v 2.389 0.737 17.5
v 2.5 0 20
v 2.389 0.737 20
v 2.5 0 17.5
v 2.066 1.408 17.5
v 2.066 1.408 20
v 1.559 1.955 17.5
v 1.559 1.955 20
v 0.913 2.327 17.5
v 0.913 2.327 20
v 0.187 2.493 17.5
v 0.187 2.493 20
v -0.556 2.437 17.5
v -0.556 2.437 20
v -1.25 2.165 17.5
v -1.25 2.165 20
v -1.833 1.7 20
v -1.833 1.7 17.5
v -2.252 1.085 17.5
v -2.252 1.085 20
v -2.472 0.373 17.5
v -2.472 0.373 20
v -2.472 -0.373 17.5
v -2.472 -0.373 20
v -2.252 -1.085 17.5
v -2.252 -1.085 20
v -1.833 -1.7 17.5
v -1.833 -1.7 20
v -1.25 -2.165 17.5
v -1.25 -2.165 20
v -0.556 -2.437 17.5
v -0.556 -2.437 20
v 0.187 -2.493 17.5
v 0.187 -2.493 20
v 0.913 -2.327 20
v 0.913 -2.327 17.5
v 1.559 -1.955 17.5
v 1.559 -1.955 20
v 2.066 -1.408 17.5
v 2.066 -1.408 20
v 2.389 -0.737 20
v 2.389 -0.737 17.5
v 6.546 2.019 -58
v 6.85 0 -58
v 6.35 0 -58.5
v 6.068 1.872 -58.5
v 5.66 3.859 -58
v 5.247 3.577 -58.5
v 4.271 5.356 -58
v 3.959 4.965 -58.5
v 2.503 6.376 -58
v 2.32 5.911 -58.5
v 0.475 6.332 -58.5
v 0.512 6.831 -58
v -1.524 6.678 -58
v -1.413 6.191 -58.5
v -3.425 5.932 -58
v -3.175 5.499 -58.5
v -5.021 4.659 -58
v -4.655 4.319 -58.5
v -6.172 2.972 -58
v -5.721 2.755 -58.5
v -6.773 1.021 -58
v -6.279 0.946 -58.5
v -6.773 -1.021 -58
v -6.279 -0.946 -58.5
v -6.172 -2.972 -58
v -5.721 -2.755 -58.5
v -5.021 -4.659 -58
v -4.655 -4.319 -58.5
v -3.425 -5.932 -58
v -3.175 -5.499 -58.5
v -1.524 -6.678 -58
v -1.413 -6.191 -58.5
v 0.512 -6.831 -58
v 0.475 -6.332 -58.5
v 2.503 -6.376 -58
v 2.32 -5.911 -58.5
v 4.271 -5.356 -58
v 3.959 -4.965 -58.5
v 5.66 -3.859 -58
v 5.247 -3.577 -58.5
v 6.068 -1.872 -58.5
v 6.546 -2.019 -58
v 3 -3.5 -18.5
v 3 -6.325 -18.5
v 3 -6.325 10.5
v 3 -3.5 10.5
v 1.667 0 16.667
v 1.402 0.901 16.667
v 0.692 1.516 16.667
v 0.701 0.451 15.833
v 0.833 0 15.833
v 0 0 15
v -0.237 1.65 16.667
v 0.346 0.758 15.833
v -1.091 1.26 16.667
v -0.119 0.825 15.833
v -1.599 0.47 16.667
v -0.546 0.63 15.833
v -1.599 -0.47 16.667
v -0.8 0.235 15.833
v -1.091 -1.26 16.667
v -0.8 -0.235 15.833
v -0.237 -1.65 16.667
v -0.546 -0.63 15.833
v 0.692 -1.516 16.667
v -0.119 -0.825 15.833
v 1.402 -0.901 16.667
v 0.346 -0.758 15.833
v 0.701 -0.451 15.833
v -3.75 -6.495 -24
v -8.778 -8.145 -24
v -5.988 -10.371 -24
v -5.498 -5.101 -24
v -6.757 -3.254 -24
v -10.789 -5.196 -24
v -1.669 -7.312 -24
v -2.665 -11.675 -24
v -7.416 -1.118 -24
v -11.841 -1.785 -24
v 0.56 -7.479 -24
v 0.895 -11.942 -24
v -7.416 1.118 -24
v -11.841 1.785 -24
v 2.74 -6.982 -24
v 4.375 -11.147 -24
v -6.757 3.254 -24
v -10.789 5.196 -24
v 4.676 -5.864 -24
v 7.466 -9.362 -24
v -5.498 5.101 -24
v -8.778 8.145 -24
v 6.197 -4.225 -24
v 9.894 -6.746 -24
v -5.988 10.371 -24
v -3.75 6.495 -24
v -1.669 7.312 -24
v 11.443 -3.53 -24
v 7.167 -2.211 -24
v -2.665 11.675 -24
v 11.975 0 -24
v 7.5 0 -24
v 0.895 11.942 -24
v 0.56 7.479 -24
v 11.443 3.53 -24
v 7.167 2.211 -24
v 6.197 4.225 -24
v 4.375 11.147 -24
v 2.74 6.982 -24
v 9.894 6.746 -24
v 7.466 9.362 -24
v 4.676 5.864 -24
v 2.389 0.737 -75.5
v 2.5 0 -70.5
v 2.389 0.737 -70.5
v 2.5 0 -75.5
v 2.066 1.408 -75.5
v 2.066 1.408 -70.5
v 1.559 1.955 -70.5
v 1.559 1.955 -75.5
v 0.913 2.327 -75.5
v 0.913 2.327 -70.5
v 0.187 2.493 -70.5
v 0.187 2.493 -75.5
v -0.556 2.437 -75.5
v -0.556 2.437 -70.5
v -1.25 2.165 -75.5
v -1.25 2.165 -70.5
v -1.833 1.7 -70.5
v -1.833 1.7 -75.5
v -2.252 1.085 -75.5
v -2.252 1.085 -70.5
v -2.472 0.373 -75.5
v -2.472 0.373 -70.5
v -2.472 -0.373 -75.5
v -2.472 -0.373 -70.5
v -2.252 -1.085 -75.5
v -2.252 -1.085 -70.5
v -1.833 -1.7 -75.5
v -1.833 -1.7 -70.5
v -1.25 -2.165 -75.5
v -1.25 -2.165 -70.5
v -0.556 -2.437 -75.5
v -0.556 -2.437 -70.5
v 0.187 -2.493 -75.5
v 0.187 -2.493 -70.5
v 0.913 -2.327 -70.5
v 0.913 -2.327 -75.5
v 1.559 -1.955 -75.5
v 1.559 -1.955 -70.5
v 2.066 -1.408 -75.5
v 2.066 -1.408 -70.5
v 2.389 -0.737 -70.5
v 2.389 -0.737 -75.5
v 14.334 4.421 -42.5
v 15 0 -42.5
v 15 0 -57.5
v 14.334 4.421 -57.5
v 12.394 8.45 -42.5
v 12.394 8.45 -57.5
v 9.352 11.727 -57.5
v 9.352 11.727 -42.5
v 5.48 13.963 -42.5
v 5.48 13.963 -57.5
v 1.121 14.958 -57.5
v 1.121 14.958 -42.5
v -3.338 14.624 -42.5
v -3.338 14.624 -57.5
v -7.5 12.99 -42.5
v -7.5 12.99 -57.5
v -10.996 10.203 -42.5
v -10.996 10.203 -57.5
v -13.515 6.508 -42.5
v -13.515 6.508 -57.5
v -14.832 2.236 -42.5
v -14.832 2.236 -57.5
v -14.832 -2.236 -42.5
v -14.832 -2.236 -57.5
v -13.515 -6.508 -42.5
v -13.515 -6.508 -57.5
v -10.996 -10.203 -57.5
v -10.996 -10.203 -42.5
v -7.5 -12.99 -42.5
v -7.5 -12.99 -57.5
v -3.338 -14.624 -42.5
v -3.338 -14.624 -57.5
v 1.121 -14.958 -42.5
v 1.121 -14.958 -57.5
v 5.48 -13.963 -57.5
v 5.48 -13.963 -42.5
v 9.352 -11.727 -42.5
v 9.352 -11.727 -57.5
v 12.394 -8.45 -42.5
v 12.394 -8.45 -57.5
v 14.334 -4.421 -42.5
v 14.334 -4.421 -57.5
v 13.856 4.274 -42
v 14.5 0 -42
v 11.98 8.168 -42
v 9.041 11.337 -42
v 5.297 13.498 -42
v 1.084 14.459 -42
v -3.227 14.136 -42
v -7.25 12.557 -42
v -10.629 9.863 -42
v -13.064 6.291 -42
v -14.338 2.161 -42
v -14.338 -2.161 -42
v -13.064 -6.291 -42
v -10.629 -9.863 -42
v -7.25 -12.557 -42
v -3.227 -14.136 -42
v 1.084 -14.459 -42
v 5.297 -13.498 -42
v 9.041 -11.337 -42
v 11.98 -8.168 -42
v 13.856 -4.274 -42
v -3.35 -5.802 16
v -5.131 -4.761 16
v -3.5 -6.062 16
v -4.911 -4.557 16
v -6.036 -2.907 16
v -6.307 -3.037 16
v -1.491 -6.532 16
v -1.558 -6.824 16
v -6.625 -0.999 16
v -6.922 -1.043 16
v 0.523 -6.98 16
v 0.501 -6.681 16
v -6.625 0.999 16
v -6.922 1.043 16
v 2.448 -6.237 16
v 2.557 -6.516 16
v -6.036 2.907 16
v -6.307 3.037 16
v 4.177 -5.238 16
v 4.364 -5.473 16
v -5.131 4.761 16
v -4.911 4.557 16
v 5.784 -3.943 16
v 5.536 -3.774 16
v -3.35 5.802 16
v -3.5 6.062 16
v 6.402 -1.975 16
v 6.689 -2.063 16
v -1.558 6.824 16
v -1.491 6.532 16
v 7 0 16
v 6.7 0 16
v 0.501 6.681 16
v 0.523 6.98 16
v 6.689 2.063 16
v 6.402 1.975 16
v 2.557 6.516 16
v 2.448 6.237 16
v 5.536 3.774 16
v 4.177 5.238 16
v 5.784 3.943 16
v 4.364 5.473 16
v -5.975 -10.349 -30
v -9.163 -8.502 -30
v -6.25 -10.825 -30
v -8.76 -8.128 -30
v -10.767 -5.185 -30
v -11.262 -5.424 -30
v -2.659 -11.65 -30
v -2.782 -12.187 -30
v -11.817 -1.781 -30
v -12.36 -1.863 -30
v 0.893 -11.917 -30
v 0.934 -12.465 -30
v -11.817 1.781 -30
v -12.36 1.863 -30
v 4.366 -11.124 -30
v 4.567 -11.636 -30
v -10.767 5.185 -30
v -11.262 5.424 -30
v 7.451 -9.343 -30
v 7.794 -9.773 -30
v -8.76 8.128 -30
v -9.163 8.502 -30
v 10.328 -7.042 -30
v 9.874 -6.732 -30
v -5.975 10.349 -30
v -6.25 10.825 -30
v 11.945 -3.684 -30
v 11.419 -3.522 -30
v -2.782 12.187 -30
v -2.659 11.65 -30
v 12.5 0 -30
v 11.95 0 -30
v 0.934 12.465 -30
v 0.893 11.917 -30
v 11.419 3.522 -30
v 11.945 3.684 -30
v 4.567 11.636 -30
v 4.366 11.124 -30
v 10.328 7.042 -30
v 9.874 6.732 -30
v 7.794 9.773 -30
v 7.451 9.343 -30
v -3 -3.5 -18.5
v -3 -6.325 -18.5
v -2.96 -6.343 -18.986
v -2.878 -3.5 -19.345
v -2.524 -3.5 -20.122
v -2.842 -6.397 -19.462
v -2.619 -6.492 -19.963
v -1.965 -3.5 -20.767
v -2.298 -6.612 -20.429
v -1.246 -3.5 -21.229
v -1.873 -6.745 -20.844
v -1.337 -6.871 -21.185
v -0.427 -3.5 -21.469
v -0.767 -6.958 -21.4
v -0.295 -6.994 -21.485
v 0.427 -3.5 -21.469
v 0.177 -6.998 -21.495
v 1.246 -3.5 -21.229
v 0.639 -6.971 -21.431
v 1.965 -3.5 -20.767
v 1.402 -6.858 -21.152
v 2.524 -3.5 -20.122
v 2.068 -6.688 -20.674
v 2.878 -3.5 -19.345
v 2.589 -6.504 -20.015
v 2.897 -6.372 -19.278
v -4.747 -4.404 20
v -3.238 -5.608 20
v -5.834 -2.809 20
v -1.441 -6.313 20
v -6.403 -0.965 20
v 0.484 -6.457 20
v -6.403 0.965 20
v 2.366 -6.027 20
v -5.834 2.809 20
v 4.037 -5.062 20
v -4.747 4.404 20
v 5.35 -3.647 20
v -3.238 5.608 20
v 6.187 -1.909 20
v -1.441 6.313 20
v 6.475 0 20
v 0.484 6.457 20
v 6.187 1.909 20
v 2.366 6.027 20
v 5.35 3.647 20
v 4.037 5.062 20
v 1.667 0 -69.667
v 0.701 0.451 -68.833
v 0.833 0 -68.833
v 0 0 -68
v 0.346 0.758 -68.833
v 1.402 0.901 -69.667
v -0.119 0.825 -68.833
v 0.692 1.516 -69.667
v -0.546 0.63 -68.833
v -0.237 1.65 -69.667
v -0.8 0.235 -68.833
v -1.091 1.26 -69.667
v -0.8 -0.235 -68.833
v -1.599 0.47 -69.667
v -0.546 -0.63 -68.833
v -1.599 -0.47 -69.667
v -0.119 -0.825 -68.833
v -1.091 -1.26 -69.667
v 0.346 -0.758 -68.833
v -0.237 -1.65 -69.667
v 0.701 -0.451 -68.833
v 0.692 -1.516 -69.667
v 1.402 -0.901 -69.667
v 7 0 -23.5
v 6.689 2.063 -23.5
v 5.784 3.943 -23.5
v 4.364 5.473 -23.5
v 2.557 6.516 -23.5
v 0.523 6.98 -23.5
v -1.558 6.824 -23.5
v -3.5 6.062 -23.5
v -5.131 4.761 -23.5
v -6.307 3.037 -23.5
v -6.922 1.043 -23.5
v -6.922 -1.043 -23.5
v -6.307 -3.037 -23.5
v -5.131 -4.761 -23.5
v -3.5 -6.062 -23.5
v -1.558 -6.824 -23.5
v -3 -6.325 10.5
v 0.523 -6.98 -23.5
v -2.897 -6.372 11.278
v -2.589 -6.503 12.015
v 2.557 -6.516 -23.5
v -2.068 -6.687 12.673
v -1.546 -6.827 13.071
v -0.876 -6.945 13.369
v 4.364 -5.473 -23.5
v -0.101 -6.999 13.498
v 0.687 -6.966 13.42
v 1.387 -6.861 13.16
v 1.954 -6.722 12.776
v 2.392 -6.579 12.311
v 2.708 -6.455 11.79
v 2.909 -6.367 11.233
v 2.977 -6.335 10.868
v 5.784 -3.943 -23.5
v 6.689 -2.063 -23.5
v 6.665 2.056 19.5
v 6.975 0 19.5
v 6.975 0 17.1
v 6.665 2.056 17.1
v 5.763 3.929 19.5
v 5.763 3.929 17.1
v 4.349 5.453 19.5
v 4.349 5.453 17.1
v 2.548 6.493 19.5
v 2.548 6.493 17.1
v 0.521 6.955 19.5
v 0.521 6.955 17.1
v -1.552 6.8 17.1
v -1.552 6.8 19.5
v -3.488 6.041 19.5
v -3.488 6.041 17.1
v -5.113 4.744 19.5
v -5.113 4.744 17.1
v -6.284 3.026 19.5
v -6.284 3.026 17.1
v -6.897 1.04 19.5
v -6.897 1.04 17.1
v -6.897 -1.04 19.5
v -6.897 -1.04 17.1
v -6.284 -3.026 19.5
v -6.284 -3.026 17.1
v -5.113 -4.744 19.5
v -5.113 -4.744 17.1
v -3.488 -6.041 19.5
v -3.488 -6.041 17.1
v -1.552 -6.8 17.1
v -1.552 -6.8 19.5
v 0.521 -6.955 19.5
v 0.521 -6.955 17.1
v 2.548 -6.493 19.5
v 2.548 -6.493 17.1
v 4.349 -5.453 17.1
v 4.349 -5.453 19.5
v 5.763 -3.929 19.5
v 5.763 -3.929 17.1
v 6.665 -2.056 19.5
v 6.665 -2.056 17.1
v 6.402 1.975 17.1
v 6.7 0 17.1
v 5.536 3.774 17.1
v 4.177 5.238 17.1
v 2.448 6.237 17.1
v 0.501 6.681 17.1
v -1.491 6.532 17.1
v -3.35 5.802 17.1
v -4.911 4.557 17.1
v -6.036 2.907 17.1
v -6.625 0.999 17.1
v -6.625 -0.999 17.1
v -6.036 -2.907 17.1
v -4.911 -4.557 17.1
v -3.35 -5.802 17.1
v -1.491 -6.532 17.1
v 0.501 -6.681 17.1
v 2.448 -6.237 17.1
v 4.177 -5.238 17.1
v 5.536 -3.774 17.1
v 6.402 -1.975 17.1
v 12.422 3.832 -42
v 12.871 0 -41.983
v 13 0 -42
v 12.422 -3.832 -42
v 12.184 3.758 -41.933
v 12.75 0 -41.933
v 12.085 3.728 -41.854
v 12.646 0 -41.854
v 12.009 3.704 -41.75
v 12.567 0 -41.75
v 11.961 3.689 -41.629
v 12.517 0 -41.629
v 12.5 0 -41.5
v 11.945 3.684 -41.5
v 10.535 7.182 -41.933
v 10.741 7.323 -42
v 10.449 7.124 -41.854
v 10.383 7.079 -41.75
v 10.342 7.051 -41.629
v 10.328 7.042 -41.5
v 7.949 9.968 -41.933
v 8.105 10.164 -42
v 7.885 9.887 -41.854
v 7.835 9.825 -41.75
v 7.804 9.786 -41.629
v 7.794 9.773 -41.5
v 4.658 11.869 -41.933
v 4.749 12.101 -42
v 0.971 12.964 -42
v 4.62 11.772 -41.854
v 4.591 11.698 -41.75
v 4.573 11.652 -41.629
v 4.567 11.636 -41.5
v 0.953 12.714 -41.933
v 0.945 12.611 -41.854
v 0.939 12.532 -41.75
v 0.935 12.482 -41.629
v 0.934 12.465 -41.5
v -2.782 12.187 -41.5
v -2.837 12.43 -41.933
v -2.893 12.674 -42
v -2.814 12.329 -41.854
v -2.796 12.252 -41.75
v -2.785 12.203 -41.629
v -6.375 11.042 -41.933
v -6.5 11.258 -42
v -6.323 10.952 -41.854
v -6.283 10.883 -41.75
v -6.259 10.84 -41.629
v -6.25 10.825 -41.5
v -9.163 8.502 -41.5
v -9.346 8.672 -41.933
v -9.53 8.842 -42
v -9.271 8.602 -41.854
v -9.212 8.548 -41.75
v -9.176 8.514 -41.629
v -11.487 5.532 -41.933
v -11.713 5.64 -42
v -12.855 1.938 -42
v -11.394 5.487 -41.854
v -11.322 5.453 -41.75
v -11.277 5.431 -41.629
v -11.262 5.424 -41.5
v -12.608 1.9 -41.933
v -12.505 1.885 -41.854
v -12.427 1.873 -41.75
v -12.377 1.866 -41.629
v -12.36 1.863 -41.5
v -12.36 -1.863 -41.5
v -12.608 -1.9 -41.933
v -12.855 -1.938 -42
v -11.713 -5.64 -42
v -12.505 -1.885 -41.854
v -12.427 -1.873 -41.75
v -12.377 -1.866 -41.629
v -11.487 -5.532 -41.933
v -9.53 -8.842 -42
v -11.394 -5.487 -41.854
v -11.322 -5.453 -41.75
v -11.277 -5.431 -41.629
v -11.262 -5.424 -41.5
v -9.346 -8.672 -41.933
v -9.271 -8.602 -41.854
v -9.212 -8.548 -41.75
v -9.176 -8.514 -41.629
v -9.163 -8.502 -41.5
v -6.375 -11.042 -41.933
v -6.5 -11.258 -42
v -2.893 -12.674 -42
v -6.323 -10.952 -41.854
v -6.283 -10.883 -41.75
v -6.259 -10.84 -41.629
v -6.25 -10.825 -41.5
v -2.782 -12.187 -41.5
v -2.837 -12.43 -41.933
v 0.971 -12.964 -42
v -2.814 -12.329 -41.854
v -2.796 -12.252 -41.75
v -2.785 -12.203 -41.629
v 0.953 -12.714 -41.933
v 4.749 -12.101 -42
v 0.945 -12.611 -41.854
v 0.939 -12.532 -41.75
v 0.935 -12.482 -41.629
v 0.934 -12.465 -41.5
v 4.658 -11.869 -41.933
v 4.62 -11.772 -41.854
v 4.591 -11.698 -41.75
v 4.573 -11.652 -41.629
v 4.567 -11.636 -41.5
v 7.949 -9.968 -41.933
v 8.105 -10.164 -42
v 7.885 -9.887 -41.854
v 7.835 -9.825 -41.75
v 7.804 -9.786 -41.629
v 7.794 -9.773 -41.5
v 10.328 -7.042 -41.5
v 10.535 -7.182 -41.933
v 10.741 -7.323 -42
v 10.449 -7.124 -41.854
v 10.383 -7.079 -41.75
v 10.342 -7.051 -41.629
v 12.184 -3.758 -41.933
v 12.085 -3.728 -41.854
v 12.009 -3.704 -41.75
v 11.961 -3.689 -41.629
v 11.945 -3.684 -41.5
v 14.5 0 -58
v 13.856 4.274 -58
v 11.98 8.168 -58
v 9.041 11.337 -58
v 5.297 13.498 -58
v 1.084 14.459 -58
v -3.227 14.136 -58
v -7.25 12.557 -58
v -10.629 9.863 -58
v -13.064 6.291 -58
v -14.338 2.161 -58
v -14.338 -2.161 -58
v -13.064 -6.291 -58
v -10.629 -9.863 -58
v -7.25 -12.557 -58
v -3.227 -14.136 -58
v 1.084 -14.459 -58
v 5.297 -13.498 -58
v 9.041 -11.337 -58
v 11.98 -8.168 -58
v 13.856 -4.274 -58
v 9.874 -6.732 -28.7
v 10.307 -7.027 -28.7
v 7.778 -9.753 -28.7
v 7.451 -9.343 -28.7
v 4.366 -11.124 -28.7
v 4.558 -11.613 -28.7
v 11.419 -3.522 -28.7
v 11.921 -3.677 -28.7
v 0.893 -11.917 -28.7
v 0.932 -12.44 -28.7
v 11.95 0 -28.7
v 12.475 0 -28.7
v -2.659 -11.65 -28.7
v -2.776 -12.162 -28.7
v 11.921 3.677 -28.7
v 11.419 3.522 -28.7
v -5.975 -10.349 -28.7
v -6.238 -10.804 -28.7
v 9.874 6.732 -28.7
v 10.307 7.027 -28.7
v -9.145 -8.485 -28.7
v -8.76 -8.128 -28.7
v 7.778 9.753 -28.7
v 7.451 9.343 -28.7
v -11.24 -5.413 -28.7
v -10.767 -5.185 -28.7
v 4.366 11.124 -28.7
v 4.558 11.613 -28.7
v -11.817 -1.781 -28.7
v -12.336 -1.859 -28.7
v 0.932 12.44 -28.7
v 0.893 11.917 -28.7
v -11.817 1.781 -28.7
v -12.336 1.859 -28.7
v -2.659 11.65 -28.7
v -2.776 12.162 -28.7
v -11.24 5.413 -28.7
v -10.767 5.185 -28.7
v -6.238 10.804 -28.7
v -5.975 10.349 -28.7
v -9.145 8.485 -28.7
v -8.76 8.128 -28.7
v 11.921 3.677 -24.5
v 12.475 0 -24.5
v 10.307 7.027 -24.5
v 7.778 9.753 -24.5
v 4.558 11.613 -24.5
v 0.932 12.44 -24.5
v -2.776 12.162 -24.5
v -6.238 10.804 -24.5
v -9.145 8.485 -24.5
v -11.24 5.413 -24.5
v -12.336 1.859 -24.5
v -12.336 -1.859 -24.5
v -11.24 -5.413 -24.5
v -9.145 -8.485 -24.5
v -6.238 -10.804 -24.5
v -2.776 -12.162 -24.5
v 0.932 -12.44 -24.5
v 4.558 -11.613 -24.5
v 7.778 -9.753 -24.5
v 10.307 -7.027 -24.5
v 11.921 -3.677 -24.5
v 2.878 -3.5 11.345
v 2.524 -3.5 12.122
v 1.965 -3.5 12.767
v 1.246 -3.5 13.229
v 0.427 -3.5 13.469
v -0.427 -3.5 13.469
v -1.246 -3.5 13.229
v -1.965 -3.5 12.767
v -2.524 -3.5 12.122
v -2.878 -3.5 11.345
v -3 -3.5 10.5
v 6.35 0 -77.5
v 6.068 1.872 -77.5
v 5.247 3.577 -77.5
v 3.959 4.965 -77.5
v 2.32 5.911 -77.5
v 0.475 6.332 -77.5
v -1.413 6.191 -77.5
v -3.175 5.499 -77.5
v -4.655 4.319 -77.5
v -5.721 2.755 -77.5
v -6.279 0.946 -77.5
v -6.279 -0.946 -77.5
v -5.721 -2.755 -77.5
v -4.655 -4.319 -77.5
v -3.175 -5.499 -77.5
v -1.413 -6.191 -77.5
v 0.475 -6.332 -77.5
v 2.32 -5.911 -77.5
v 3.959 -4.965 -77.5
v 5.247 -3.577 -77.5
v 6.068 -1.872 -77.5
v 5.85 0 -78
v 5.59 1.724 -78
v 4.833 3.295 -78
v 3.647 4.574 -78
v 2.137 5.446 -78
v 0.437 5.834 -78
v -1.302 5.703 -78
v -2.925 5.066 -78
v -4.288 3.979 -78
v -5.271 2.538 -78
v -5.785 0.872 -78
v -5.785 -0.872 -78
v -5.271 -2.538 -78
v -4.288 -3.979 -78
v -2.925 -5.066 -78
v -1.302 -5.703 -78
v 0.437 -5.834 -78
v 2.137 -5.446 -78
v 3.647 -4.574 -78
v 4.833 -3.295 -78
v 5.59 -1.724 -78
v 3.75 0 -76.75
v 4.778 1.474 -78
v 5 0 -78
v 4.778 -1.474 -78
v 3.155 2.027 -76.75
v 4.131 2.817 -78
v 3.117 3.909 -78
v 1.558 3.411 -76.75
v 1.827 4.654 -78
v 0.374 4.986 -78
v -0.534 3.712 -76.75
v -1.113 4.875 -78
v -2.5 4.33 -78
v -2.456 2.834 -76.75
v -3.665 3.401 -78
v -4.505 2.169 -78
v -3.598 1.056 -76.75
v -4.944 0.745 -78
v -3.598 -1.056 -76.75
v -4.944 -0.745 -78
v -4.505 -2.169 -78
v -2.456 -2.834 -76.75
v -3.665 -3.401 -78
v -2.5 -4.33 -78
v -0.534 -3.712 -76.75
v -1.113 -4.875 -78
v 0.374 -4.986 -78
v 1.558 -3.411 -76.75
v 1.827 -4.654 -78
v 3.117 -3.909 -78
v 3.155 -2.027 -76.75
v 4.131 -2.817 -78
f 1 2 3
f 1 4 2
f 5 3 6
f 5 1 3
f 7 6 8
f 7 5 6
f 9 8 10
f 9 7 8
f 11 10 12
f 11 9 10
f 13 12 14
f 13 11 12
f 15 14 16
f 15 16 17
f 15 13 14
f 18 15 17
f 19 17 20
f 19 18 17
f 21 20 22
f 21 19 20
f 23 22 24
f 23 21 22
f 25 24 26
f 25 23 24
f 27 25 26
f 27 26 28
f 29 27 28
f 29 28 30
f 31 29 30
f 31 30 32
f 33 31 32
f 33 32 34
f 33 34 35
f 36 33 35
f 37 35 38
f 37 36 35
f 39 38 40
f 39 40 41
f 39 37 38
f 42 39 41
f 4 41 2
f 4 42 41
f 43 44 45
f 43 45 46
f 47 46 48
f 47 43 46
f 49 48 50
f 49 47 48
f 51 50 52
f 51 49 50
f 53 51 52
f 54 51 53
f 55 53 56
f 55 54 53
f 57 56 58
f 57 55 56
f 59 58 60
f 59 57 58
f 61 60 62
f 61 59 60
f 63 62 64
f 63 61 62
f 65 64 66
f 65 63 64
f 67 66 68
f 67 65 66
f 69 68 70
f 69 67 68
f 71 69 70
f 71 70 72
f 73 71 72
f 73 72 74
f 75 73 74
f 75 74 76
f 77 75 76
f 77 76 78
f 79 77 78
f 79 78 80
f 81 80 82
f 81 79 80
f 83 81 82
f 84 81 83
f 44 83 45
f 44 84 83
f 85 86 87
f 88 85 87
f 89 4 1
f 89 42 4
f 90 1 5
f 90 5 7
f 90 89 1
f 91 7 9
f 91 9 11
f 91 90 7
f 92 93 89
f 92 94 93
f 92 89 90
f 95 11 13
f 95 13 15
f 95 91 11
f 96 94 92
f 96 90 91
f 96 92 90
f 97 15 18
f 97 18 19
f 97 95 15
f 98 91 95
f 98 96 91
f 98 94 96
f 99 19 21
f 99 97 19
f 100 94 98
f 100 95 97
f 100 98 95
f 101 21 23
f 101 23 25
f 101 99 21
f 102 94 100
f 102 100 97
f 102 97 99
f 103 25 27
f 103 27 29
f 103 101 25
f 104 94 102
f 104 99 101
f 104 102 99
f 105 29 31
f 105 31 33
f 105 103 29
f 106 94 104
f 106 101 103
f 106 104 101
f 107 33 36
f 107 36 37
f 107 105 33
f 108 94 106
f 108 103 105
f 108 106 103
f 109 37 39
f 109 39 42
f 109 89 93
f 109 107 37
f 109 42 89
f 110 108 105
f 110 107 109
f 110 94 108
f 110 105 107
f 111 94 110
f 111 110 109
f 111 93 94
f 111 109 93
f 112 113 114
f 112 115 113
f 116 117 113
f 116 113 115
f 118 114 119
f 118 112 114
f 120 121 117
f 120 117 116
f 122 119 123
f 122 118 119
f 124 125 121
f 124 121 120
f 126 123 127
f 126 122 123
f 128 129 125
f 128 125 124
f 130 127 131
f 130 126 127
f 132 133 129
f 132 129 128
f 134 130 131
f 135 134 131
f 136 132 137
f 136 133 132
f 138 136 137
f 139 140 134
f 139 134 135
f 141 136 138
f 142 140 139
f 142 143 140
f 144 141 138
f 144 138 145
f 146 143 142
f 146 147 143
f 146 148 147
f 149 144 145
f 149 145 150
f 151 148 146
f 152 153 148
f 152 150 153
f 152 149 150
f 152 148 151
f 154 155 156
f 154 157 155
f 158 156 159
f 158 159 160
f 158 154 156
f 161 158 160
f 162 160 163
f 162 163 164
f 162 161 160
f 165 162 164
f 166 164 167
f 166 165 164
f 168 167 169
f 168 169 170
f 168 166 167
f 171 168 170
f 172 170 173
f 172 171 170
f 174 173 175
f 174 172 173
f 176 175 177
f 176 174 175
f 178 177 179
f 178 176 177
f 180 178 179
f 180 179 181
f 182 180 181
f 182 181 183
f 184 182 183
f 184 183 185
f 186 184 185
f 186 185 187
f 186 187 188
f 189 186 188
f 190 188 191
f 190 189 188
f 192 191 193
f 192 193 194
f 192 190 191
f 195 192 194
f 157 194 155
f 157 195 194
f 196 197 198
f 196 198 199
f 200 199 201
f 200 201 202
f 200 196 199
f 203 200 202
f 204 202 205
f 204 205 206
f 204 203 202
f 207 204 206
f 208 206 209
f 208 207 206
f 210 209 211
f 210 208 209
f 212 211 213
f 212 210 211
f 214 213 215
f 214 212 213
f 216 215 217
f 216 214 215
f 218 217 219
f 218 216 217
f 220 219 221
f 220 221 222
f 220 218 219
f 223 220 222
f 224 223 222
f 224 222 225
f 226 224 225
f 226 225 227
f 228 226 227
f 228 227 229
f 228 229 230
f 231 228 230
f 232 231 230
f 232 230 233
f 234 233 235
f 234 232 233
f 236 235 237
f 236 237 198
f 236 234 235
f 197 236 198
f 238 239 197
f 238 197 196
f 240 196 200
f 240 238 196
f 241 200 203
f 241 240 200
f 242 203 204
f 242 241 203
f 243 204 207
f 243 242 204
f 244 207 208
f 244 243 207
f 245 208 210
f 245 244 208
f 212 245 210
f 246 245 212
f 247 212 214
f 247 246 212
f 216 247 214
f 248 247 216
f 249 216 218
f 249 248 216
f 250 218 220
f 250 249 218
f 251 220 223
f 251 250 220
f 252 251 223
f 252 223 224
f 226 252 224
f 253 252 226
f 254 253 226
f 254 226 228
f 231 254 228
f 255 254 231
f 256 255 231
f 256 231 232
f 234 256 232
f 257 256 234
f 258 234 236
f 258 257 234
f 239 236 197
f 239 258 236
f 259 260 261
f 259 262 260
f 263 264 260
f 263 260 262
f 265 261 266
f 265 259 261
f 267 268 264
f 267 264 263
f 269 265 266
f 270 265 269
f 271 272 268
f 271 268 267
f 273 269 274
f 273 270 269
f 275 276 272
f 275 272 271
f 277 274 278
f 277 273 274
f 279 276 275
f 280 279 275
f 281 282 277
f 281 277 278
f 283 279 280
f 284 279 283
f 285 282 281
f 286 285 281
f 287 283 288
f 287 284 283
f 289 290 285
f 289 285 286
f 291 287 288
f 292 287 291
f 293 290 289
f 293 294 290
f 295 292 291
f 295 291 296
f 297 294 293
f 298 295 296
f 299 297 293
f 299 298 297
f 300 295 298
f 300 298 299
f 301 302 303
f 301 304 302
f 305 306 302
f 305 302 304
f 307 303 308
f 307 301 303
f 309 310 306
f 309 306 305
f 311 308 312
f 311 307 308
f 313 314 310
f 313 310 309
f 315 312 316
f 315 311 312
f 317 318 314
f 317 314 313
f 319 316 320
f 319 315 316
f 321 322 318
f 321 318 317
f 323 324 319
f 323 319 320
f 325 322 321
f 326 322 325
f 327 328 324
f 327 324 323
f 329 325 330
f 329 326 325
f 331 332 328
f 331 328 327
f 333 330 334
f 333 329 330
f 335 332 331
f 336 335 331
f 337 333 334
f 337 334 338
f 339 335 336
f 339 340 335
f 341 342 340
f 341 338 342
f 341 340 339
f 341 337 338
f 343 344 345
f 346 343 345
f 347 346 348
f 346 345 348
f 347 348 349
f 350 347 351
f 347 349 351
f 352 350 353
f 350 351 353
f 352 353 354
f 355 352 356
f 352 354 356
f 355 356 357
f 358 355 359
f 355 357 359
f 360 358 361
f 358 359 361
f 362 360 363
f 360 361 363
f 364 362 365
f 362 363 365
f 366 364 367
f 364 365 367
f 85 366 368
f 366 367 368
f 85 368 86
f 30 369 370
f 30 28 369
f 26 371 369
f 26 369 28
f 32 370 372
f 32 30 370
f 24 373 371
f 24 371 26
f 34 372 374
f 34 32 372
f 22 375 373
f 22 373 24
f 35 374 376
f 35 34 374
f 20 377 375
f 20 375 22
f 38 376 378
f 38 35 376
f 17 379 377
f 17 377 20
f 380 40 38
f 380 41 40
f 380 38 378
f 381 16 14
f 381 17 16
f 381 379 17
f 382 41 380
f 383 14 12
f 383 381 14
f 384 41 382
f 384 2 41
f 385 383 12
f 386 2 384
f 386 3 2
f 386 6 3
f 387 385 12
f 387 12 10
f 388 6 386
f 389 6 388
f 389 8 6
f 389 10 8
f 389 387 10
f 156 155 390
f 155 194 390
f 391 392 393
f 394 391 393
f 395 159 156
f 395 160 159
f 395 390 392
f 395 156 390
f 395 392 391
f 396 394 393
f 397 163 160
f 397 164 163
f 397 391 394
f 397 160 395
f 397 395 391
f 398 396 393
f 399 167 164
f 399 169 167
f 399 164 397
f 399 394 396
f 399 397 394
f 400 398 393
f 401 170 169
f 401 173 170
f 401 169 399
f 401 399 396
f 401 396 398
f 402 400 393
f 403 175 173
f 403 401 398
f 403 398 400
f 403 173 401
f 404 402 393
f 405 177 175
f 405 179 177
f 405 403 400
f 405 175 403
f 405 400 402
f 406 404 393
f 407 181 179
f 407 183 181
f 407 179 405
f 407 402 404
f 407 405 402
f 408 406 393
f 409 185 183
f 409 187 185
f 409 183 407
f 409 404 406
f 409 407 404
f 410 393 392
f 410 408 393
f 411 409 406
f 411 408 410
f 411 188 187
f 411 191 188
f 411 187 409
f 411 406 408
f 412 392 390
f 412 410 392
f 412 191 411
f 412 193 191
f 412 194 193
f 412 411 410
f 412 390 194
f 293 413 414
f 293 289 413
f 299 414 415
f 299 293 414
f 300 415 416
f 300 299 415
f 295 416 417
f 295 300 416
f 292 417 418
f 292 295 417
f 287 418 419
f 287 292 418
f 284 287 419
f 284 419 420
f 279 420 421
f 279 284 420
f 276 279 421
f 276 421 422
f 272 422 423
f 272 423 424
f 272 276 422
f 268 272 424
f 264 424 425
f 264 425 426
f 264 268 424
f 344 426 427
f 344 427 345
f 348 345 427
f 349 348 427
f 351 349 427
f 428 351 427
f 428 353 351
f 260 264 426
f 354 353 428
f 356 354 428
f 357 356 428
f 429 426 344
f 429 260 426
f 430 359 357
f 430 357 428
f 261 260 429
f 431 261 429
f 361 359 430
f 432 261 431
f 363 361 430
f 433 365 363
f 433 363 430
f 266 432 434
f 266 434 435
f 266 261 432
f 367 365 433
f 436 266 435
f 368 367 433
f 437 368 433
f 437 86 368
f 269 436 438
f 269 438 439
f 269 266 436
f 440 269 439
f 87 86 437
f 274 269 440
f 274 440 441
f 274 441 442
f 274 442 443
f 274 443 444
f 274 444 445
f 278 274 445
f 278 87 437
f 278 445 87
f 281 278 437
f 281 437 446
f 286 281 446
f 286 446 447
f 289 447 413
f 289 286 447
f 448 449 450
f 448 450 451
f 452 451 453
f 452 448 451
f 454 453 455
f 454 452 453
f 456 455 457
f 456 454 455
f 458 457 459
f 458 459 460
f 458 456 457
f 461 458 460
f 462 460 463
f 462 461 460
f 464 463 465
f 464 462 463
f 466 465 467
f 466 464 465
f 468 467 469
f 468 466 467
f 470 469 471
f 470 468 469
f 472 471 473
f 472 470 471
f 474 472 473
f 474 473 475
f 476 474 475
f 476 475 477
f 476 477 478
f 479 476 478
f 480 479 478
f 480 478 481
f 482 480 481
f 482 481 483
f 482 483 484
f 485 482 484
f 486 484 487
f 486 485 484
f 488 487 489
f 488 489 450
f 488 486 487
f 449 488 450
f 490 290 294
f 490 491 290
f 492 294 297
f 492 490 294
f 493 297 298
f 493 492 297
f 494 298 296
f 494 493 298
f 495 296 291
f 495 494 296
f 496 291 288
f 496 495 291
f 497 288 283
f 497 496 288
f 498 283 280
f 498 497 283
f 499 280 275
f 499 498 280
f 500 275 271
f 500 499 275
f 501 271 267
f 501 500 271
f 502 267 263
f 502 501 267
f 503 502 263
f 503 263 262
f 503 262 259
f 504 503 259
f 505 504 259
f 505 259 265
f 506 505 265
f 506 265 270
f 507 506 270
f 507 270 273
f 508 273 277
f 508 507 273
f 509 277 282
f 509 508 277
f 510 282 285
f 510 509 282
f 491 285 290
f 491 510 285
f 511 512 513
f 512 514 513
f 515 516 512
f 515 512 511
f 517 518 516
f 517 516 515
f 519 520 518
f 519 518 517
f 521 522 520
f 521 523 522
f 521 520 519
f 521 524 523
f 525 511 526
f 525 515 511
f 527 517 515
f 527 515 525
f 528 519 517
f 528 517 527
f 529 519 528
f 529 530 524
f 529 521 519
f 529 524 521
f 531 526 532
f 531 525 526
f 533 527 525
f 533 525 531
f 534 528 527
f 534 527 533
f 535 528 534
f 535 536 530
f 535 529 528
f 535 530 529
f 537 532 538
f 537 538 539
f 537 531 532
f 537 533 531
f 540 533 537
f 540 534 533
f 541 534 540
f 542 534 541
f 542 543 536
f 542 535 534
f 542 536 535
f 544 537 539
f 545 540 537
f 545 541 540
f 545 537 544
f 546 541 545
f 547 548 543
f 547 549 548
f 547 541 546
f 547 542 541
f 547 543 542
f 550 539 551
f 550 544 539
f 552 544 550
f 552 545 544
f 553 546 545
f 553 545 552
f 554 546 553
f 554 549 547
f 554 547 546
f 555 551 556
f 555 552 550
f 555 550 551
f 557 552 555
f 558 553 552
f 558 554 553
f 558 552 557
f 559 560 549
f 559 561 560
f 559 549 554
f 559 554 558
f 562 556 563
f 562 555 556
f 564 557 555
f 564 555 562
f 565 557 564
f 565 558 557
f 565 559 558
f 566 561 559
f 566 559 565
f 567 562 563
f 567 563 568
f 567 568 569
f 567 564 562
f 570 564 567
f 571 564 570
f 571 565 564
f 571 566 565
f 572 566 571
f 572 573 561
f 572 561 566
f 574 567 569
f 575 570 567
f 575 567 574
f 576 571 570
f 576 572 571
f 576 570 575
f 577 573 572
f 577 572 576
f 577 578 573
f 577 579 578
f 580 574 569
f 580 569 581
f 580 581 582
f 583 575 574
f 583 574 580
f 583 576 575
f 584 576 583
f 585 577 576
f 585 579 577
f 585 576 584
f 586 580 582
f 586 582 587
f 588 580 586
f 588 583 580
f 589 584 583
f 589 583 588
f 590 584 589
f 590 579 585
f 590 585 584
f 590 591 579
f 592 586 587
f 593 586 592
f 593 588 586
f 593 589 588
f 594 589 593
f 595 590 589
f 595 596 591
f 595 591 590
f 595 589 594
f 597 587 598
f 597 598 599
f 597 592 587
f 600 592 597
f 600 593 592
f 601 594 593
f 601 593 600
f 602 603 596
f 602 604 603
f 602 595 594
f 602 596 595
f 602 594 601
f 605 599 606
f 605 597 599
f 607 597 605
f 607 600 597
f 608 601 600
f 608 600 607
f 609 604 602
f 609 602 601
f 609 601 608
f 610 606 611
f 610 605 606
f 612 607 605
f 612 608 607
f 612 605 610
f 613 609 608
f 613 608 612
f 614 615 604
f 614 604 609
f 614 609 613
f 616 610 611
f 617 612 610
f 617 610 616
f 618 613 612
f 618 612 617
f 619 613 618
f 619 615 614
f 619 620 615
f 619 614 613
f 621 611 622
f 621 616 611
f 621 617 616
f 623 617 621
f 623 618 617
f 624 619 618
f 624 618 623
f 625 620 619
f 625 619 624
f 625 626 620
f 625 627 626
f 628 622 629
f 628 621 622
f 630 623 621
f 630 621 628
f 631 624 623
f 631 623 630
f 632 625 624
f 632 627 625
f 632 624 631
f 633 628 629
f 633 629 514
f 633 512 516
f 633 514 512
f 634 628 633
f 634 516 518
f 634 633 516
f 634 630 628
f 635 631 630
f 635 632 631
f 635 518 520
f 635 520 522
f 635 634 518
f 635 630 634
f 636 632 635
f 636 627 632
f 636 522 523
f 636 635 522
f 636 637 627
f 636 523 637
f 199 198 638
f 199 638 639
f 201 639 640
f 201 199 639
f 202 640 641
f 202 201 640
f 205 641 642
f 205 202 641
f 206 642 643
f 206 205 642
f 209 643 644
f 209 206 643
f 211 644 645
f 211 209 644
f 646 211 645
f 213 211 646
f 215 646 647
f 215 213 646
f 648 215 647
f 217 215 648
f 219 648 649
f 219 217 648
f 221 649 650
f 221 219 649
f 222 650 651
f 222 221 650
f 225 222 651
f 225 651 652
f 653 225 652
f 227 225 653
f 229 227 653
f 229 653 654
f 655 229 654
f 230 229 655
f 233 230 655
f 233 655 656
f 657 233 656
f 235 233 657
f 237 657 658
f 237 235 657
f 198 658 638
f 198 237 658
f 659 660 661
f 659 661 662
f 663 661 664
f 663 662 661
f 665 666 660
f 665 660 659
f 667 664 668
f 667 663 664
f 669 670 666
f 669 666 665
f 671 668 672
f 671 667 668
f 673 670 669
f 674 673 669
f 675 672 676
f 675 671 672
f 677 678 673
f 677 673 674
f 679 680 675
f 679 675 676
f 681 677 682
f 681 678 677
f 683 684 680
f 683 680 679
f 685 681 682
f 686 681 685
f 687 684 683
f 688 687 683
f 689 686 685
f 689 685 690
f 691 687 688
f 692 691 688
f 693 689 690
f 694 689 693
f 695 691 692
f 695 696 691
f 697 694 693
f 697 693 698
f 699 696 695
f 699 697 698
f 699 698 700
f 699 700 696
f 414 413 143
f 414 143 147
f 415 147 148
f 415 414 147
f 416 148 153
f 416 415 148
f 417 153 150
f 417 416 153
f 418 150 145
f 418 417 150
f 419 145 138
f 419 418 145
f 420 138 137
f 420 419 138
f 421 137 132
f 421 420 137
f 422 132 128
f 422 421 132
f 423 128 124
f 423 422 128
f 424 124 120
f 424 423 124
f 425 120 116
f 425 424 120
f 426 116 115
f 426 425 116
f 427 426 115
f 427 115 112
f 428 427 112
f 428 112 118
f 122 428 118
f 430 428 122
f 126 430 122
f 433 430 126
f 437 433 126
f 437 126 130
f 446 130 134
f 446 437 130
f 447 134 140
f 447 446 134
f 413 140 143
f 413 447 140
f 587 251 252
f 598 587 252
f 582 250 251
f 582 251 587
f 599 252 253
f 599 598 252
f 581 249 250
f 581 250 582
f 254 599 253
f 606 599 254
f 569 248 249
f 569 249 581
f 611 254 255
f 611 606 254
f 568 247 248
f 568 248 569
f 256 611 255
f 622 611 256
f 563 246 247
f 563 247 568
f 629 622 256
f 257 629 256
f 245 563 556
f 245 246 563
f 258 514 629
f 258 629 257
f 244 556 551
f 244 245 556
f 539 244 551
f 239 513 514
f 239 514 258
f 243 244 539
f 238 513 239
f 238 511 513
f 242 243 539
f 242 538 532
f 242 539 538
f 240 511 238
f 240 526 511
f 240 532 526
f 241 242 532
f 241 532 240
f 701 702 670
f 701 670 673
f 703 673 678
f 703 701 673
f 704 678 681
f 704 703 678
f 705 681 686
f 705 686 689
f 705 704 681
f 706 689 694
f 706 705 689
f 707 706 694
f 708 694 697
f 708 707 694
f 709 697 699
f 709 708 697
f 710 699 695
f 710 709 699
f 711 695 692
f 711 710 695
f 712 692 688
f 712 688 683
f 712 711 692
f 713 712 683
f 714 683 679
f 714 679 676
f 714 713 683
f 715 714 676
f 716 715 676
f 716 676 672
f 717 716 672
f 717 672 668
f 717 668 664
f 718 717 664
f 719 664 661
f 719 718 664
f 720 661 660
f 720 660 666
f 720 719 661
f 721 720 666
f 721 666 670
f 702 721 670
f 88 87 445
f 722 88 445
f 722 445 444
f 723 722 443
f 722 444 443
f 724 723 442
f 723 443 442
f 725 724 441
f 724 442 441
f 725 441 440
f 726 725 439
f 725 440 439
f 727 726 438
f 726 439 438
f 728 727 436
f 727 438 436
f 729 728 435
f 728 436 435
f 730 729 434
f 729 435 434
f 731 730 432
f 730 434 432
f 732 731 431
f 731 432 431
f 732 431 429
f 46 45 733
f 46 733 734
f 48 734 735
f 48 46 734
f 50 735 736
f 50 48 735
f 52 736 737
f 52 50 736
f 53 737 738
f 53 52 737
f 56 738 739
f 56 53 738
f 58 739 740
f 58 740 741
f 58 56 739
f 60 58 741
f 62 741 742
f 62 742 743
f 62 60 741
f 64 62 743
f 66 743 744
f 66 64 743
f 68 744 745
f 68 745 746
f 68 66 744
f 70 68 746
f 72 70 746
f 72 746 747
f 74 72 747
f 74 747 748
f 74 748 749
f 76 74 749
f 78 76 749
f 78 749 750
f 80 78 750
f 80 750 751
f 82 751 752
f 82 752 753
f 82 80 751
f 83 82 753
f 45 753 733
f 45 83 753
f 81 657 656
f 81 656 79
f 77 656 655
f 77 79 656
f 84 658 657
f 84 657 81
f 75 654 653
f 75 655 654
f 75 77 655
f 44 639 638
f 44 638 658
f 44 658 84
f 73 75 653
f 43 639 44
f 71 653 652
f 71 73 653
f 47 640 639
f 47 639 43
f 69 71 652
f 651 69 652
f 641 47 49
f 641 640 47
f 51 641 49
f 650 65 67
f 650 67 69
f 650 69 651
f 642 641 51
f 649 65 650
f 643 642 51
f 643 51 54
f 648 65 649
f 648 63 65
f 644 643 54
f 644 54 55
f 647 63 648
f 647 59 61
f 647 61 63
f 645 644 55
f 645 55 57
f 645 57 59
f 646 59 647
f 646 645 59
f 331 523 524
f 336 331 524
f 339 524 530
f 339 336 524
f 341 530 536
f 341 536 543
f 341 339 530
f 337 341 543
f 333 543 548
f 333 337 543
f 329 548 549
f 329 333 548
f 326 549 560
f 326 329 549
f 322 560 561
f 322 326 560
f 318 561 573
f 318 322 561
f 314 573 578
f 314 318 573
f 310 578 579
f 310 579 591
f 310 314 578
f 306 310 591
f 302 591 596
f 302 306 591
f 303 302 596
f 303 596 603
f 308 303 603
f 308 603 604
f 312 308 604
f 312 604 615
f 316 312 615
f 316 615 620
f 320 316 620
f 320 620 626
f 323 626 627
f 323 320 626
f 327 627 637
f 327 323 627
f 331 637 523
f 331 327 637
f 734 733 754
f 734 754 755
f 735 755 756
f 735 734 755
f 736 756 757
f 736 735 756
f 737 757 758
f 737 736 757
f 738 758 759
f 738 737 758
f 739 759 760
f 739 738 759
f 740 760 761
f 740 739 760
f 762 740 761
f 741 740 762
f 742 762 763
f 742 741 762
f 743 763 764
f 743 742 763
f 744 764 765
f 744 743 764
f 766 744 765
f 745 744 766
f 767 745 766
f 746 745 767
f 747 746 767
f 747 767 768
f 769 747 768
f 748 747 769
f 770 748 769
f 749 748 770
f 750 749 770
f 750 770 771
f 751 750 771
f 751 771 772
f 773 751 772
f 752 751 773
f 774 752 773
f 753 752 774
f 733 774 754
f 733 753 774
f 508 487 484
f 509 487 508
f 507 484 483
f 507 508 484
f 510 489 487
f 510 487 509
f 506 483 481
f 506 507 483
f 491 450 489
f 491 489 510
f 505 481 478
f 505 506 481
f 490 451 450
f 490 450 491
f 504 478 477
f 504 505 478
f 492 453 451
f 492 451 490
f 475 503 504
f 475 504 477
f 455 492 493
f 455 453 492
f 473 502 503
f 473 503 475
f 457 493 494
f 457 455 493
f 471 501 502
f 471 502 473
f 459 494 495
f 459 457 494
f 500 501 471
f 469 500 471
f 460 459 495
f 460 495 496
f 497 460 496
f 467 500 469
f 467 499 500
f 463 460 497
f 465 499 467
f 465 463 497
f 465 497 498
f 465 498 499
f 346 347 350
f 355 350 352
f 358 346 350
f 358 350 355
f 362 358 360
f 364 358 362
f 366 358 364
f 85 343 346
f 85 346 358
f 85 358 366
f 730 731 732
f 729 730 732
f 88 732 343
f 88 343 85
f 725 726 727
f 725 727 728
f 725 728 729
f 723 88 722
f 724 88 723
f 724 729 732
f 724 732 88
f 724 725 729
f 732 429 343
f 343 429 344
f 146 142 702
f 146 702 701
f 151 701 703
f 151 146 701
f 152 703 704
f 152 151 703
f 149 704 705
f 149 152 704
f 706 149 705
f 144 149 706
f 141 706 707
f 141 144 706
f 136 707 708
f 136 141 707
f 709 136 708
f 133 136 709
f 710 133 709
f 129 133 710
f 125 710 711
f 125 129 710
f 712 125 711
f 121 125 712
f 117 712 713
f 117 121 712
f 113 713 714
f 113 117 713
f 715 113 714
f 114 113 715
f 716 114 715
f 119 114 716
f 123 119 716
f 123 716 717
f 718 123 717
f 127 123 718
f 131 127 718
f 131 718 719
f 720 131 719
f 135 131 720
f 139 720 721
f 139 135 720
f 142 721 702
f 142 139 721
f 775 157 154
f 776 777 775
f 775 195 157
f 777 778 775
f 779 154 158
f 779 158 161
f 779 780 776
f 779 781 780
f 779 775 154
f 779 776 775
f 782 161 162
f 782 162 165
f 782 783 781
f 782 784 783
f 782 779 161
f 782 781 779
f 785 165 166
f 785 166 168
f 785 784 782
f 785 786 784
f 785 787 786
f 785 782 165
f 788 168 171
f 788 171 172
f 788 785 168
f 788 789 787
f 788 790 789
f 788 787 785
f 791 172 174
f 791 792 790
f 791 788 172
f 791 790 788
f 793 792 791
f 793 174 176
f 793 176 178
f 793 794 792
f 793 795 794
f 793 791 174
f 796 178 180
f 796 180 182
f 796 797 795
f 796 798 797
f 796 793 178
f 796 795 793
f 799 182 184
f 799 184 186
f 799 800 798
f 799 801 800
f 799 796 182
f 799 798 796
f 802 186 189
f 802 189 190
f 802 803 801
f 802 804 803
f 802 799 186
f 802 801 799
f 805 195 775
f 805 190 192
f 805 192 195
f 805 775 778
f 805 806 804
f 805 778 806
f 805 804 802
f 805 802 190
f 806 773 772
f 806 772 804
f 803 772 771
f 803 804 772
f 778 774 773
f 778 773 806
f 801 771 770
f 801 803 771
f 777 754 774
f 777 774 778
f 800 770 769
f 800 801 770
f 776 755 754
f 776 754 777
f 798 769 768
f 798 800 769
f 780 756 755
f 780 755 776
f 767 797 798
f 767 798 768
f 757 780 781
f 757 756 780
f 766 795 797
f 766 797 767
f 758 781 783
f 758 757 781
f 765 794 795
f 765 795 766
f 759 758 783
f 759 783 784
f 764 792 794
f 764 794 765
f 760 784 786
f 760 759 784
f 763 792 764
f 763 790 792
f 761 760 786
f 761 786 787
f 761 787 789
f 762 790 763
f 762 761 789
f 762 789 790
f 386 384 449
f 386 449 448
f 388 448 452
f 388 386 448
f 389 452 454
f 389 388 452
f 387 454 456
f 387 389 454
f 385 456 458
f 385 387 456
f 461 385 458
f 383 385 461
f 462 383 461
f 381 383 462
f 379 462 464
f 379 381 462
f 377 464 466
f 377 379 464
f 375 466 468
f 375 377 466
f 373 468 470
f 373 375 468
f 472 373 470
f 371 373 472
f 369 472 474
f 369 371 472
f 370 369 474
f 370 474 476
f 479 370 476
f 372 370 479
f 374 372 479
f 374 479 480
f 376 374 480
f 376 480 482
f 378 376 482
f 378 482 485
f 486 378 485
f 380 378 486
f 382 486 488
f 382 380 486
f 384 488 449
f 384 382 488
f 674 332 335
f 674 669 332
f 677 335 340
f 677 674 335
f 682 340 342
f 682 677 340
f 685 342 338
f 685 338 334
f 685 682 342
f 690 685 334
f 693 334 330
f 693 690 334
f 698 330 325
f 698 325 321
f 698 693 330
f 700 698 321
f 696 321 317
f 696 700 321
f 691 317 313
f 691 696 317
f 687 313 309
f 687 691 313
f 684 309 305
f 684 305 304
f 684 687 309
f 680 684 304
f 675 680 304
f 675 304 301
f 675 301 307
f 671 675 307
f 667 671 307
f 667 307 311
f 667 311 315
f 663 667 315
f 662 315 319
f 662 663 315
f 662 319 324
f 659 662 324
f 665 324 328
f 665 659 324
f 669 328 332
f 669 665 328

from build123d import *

# Parameters (mm, degrees)
F2_SIZE  = 0.5
F3_R     = 0.5
F6_DEPTH = 3.5


with BuildPart() as f1:
    # F0 (on Front) → F1 (revolve)
    with BuildSketch(Plane.XZ):
        Polygon((0, 15), (0, 0), (0, -68), (2.5, -70.5), (2.5, -75.5), (5, -78), (6.35, -78), (6.35, -58), (15, -58), (15, -42), (12.5, -42), (12.5, -30), (11.95, -30), (11.95, -28.7), (12.475, -28.7), (12.475, -24), (7, -24), (7, 16), (6.7, 16), (6.7, 17.1), (6.975, 17.1), (6.975, 20), (2.5, 20), (2.5, 17.5), align=None)
    revolve(axis=Axis((0, 0, 55.465363), (0, 0, 1)))

    # F2
    f2_edges = [f1.edges().sort_by_distance(p)[0] for p in [
        (-6.975, 0, 20),
        (-12.475, 0, -24),
        (-7, 0, -24),
        (-6.35, 0, -58),
        (-15, 0, -58),
        (-6.35, 0, -78),
        (-15, 0, -42),
    ]]
    chamfer(f2_edges, length=F2_SIZE)

    # F3
    f3_edges = [f1.edges().sort_by_distance(p)[0] for p in [
        (-12.5, 0, -42),
    ]]
    fillet(f3_edges, radius=F3_R)

    # F5 (on offset) → F6 (cut)
    with BuildSketch(Plane.XZ.offset(7)):
        with BuildLine():
            Line((3, -18.5), (3, 10.5))
            ThreePointArc((3, 10.5), (0, 13.5), (-3, 10.5))
            Line((-3, 10.5), (-3, -18.5))
            ThreePointArc((-3, -18.5), (0, -21.5), (3, -18.5))
        make_face()
    extrude(amount=-F6_DEPTH, mode=Mode.SUBTRACT)


solid = f1.part
